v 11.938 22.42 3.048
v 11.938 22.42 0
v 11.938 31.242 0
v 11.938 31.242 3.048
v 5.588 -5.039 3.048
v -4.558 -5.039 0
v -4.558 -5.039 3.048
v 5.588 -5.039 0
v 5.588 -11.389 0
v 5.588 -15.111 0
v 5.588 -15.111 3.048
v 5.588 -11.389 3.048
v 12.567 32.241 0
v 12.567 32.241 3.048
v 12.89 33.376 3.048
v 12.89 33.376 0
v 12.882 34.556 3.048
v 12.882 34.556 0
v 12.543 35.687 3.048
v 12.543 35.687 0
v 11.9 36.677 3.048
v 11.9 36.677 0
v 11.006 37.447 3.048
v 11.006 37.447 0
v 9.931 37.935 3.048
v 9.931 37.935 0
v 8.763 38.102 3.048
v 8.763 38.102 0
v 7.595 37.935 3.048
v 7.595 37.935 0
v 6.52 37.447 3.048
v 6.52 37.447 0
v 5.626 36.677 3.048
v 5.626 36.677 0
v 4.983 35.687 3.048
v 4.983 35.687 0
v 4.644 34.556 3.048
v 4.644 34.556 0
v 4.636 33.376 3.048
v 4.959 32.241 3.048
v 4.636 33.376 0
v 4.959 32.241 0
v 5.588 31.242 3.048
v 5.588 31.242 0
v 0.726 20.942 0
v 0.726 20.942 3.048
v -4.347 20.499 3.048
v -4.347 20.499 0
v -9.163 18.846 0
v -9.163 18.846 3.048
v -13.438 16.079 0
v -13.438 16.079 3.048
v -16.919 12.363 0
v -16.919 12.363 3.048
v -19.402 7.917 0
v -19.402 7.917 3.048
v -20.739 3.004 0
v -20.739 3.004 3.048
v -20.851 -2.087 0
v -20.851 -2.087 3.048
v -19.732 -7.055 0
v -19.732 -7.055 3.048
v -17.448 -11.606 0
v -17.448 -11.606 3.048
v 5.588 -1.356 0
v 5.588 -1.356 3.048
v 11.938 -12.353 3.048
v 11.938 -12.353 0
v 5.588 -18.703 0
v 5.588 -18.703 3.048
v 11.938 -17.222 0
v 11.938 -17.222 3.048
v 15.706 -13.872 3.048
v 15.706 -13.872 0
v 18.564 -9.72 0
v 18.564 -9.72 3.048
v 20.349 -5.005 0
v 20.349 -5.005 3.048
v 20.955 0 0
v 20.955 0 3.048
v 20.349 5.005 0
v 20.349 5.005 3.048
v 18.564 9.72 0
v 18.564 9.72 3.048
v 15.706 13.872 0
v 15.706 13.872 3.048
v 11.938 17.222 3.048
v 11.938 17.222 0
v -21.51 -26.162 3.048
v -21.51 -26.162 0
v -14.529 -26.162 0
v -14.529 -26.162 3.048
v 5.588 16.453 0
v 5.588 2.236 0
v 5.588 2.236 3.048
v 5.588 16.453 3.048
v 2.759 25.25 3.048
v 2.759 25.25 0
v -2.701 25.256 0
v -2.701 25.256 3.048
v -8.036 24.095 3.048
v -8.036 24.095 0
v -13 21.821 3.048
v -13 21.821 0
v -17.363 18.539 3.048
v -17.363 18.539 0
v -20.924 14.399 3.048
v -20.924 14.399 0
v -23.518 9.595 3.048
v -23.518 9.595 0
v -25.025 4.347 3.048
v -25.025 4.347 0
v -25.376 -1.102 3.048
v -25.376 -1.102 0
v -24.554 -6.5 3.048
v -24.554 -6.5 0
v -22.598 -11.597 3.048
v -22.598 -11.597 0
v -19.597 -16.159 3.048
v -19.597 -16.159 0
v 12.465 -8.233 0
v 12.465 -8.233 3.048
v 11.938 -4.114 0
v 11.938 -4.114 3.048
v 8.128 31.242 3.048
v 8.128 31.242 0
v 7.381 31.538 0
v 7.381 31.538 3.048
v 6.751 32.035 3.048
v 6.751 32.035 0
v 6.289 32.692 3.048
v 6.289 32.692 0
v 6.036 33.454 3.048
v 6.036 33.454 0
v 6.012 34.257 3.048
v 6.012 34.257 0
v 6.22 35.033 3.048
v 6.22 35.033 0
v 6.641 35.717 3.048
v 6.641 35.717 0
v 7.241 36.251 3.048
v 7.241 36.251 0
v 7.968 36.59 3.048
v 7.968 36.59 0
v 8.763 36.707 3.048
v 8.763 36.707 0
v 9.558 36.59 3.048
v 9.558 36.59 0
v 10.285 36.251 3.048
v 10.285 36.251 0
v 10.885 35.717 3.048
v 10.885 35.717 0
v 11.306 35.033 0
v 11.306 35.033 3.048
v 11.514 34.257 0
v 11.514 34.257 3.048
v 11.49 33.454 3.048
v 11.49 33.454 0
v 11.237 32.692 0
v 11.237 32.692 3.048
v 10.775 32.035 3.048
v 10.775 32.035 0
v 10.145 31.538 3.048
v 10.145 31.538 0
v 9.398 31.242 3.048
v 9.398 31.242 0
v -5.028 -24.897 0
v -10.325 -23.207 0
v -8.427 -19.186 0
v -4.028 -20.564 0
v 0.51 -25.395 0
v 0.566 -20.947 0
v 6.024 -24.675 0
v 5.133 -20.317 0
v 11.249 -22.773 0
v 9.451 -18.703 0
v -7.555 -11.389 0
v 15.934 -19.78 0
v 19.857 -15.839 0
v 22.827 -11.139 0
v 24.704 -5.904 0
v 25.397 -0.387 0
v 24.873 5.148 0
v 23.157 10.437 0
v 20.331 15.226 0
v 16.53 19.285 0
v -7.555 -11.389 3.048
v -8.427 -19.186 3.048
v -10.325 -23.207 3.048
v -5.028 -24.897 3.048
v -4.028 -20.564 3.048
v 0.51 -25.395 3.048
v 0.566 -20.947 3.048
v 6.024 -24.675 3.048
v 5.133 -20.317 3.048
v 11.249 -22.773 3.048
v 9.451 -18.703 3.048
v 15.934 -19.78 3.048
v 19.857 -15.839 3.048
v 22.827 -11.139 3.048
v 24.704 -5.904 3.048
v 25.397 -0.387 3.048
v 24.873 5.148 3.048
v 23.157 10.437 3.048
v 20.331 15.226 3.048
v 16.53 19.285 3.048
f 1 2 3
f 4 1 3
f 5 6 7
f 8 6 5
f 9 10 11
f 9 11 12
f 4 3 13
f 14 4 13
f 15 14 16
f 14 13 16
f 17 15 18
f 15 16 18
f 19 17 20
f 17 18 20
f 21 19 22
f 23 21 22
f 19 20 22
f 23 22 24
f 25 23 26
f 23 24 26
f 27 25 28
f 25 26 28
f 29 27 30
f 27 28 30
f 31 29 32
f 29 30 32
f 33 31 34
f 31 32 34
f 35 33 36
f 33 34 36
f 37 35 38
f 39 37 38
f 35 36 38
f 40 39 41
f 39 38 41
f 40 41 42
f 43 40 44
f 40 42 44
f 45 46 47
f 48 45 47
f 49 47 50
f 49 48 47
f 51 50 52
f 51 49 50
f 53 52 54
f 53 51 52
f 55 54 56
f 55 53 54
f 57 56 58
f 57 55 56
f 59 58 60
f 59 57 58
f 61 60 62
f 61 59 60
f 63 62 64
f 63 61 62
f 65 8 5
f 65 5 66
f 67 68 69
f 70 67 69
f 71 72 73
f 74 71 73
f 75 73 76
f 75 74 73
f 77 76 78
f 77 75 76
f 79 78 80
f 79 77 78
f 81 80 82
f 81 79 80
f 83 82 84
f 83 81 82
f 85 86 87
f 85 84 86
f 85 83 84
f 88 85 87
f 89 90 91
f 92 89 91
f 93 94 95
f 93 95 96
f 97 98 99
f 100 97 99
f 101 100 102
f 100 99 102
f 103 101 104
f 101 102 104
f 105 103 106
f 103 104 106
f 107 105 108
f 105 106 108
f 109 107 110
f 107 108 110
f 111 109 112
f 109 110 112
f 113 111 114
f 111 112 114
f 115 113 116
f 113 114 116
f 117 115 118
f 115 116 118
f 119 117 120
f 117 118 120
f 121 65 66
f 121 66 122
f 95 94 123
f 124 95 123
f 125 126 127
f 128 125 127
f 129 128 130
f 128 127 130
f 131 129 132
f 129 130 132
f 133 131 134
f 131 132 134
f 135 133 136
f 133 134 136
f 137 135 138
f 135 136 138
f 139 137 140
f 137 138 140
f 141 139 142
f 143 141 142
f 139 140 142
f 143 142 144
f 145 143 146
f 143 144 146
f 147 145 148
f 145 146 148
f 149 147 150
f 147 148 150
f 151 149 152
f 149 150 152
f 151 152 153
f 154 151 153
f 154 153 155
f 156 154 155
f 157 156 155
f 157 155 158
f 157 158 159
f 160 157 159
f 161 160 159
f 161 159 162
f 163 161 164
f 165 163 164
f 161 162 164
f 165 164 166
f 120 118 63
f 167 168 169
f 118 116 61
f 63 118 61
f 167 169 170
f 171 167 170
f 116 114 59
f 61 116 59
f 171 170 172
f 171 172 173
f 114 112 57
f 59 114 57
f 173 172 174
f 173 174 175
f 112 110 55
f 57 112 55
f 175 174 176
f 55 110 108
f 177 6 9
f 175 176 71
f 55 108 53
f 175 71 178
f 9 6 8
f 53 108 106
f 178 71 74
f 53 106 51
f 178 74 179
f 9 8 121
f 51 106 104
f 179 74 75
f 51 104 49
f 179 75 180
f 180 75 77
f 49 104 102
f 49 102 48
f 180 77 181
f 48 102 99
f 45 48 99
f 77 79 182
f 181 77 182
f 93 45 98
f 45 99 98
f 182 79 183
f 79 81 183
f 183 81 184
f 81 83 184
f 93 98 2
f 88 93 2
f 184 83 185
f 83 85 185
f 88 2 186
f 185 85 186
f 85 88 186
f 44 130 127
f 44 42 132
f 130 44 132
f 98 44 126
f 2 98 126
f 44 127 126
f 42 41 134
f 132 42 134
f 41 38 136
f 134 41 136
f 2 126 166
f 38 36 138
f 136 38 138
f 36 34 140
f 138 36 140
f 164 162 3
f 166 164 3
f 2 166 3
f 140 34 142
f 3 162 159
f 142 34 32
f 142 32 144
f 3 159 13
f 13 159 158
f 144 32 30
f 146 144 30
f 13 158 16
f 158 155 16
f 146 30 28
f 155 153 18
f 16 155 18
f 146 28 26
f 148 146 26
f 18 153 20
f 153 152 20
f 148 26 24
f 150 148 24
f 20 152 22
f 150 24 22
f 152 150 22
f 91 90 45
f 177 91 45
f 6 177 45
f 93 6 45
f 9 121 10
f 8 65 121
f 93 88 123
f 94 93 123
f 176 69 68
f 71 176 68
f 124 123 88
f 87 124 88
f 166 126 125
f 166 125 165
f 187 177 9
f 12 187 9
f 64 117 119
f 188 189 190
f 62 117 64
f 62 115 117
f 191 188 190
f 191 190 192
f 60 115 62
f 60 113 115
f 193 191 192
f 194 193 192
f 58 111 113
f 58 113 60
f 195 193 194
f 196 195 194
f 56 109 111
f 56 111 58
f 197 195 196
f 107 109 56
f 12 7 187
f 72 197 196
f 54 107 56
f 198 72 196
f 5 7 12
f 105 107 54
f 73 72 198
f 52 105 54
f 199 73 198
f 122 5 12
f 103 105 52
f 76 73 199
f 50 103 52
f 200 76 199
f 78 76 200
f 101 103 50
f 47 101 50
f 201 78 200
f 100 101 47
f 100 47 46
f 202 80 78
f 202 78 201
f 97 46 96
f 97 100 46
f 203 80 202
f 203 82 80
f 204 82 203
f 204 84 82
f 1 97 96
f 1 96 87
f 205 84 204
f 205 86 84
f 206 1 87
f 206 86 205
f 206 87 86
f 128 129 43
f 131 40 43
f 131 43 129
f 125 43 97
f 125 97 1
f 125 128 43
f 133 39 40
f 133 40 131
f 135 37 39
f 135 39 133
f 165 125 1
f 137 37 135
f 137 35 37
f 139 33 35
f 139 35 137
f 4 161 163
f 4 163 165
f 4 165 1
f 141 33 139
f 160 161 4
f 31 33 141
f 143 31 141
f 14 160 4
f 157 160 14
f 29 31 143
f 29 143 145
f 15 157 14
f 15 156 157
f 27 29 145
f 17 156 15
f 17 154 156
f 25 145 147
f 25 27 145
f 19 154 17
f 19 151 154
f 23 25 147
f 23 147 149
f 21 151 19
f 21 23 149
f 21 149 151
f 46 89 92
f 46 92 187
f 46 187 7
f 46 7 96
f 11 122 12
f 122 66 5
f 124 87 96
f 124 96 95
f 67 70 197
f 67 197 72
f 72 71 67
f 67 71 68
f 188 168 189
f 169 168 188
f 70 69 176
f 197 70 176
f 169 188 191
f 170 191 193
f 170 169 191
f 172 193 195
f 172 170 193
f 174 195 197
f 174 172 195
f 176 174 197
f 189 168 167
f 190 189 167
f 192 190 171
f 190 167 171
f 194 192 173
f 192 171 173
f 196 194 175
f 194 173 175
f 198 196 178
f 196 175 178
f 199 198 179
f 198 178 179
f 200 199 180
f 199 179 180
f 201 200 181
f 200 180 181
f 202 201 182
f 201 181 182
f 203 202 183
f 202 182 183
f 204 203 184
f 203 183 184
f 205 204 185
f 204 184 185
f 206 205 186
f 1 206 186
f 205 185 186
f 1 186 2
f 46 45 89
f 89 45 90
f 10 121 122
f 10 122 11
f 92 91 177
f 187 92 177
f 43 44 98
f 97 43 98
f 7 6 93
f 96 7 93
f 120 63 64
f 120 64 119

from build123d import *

# Parameters (mm, degrees)
SKETCH2_R           = 25.4
SKETCH2_R_2         = 20.955
BOSS_EXTRUDE1_DEPTH = 3.048
SKETCH3_W           = 6.35
SKETCH3_H           = 49.944808163
BOSS_EXTRUDE2_DEPTH = 3.048
CUT_EXTRUDE1_DEPTH  = 3.302
BOSS_EXTRUDE3_DEPTH = 3.048
CUT_EXTRUDE2_DEPTH  = 3.048
SKETCH12_W          = 13.143188689
SKETCH12_H          = 6.35
BOSS_EXTRUDE5_DEPTH = 3.048
SKETCH6_W           = 27.175313858
SKETCH6_H           = 4.151974609
CUT_EXTRUDE4_DEPTH  = 3.048
BOSS_EXTRUDE6_DEPTH = 3.048


with BuildPart() as part:
    # Sketch2 → Boss-Extrude1 (new body)
    with BuildSketch(Plane.XY):
        Circle(SKETCH2_R)
        Circle(SKETCH2_R_2, mode=Mode.SUBTRACT)
    extrude(amount=BOSS_EXTRUDE1_DEPTH)

    # Sketch3 → Boss-Extrude2 (add)
    with BuildSketch(Plane.XY):
        with Locations((8.763, 6.269595919)):
            Rectangle(SKETCH3_W, SKETCH3_H)
    extrude(amount=BOSS_EXTRUDE2_DEPTH)

    # Sketch8 → Cut-Extrude1 (cut)
    with BuildSketch(Plane.XY):
        Polygon((-11.882255203, 0.183619794), (-24.319009678, -26.162), (-14.01620416, -31.025558483), (-1.579449685, -4.679938689), align=None)
    extrude(amount=CUT_EXTRUDE1_DEPTH, mode=Mode.SUBTRACT)

    # Sketch7 → Boss-Extrude3 (add)
    with BuildSketch(Plane.XY):
        Polygon((5.588, 31.242), (-21.510222, -26.162), (-15.801284542, -28.856969943), (11.296937458, 28.547030057), align=None)
    extrude(amount=BOSS_EXTRUDE3_DEPTH)

    # Sketch9 → Cut-Extrude2 (cut)
    with BuildSketch(Plane.XY):
        Polygon((5.588, -18.702808163), (5.588, 2.236396155), (16.057602159, -8.233206004), align=None)
    extrude(amount=CUT_EXTRUDE2_DEPTH, mode=Mode.SUBTRACT)

    # Sketch12 → Boss-Extrude5 (add)
    with BuildSketch(Plane.XY):
        Polygon((5.588, -15.110705714), (5.588, -1.355706294), (12.46549971, -8.233206004), align=None)
        with Locations((-0.983594345, -8.213706294)):
            Rectangle(SKETCH12_W, SKETCH12_H)
    extrude(amount=BOSS_EXTRUDE5_DEPTH)

    # Sketch6 → Cut-Extrude4 (cut)
    with BuildSketch(Plane.XY):
        with Locations((-13.587656929, -28.237987305)):
            Rectangle(SKETCH6_W, SKETCH6_H)
    extrude(amount=CUT_EXTRUDE4_DEPTH, mode=Mode.SUBTRACT)

    # Sketch13 → Boss-Extrude6 (add)
    with BuildSketch(Plane.XY):
        with BuildLine():
            Line((5.588, 31.242), (8.128, 31.242))
            ThreePointArc((8.128, 31.242), (8.763, 36.706884628), (9.398, 31.242))
            Line((9.398, 31.242), (11.938, 31.242))
            ThreePointArc((11.938, 31.242), (8.763, 38.102476668), (5.588, 31.242))
        make_face()
    extrude(amount=BOSS_EXTRUDE6_DEPTH)


solid = part.part
